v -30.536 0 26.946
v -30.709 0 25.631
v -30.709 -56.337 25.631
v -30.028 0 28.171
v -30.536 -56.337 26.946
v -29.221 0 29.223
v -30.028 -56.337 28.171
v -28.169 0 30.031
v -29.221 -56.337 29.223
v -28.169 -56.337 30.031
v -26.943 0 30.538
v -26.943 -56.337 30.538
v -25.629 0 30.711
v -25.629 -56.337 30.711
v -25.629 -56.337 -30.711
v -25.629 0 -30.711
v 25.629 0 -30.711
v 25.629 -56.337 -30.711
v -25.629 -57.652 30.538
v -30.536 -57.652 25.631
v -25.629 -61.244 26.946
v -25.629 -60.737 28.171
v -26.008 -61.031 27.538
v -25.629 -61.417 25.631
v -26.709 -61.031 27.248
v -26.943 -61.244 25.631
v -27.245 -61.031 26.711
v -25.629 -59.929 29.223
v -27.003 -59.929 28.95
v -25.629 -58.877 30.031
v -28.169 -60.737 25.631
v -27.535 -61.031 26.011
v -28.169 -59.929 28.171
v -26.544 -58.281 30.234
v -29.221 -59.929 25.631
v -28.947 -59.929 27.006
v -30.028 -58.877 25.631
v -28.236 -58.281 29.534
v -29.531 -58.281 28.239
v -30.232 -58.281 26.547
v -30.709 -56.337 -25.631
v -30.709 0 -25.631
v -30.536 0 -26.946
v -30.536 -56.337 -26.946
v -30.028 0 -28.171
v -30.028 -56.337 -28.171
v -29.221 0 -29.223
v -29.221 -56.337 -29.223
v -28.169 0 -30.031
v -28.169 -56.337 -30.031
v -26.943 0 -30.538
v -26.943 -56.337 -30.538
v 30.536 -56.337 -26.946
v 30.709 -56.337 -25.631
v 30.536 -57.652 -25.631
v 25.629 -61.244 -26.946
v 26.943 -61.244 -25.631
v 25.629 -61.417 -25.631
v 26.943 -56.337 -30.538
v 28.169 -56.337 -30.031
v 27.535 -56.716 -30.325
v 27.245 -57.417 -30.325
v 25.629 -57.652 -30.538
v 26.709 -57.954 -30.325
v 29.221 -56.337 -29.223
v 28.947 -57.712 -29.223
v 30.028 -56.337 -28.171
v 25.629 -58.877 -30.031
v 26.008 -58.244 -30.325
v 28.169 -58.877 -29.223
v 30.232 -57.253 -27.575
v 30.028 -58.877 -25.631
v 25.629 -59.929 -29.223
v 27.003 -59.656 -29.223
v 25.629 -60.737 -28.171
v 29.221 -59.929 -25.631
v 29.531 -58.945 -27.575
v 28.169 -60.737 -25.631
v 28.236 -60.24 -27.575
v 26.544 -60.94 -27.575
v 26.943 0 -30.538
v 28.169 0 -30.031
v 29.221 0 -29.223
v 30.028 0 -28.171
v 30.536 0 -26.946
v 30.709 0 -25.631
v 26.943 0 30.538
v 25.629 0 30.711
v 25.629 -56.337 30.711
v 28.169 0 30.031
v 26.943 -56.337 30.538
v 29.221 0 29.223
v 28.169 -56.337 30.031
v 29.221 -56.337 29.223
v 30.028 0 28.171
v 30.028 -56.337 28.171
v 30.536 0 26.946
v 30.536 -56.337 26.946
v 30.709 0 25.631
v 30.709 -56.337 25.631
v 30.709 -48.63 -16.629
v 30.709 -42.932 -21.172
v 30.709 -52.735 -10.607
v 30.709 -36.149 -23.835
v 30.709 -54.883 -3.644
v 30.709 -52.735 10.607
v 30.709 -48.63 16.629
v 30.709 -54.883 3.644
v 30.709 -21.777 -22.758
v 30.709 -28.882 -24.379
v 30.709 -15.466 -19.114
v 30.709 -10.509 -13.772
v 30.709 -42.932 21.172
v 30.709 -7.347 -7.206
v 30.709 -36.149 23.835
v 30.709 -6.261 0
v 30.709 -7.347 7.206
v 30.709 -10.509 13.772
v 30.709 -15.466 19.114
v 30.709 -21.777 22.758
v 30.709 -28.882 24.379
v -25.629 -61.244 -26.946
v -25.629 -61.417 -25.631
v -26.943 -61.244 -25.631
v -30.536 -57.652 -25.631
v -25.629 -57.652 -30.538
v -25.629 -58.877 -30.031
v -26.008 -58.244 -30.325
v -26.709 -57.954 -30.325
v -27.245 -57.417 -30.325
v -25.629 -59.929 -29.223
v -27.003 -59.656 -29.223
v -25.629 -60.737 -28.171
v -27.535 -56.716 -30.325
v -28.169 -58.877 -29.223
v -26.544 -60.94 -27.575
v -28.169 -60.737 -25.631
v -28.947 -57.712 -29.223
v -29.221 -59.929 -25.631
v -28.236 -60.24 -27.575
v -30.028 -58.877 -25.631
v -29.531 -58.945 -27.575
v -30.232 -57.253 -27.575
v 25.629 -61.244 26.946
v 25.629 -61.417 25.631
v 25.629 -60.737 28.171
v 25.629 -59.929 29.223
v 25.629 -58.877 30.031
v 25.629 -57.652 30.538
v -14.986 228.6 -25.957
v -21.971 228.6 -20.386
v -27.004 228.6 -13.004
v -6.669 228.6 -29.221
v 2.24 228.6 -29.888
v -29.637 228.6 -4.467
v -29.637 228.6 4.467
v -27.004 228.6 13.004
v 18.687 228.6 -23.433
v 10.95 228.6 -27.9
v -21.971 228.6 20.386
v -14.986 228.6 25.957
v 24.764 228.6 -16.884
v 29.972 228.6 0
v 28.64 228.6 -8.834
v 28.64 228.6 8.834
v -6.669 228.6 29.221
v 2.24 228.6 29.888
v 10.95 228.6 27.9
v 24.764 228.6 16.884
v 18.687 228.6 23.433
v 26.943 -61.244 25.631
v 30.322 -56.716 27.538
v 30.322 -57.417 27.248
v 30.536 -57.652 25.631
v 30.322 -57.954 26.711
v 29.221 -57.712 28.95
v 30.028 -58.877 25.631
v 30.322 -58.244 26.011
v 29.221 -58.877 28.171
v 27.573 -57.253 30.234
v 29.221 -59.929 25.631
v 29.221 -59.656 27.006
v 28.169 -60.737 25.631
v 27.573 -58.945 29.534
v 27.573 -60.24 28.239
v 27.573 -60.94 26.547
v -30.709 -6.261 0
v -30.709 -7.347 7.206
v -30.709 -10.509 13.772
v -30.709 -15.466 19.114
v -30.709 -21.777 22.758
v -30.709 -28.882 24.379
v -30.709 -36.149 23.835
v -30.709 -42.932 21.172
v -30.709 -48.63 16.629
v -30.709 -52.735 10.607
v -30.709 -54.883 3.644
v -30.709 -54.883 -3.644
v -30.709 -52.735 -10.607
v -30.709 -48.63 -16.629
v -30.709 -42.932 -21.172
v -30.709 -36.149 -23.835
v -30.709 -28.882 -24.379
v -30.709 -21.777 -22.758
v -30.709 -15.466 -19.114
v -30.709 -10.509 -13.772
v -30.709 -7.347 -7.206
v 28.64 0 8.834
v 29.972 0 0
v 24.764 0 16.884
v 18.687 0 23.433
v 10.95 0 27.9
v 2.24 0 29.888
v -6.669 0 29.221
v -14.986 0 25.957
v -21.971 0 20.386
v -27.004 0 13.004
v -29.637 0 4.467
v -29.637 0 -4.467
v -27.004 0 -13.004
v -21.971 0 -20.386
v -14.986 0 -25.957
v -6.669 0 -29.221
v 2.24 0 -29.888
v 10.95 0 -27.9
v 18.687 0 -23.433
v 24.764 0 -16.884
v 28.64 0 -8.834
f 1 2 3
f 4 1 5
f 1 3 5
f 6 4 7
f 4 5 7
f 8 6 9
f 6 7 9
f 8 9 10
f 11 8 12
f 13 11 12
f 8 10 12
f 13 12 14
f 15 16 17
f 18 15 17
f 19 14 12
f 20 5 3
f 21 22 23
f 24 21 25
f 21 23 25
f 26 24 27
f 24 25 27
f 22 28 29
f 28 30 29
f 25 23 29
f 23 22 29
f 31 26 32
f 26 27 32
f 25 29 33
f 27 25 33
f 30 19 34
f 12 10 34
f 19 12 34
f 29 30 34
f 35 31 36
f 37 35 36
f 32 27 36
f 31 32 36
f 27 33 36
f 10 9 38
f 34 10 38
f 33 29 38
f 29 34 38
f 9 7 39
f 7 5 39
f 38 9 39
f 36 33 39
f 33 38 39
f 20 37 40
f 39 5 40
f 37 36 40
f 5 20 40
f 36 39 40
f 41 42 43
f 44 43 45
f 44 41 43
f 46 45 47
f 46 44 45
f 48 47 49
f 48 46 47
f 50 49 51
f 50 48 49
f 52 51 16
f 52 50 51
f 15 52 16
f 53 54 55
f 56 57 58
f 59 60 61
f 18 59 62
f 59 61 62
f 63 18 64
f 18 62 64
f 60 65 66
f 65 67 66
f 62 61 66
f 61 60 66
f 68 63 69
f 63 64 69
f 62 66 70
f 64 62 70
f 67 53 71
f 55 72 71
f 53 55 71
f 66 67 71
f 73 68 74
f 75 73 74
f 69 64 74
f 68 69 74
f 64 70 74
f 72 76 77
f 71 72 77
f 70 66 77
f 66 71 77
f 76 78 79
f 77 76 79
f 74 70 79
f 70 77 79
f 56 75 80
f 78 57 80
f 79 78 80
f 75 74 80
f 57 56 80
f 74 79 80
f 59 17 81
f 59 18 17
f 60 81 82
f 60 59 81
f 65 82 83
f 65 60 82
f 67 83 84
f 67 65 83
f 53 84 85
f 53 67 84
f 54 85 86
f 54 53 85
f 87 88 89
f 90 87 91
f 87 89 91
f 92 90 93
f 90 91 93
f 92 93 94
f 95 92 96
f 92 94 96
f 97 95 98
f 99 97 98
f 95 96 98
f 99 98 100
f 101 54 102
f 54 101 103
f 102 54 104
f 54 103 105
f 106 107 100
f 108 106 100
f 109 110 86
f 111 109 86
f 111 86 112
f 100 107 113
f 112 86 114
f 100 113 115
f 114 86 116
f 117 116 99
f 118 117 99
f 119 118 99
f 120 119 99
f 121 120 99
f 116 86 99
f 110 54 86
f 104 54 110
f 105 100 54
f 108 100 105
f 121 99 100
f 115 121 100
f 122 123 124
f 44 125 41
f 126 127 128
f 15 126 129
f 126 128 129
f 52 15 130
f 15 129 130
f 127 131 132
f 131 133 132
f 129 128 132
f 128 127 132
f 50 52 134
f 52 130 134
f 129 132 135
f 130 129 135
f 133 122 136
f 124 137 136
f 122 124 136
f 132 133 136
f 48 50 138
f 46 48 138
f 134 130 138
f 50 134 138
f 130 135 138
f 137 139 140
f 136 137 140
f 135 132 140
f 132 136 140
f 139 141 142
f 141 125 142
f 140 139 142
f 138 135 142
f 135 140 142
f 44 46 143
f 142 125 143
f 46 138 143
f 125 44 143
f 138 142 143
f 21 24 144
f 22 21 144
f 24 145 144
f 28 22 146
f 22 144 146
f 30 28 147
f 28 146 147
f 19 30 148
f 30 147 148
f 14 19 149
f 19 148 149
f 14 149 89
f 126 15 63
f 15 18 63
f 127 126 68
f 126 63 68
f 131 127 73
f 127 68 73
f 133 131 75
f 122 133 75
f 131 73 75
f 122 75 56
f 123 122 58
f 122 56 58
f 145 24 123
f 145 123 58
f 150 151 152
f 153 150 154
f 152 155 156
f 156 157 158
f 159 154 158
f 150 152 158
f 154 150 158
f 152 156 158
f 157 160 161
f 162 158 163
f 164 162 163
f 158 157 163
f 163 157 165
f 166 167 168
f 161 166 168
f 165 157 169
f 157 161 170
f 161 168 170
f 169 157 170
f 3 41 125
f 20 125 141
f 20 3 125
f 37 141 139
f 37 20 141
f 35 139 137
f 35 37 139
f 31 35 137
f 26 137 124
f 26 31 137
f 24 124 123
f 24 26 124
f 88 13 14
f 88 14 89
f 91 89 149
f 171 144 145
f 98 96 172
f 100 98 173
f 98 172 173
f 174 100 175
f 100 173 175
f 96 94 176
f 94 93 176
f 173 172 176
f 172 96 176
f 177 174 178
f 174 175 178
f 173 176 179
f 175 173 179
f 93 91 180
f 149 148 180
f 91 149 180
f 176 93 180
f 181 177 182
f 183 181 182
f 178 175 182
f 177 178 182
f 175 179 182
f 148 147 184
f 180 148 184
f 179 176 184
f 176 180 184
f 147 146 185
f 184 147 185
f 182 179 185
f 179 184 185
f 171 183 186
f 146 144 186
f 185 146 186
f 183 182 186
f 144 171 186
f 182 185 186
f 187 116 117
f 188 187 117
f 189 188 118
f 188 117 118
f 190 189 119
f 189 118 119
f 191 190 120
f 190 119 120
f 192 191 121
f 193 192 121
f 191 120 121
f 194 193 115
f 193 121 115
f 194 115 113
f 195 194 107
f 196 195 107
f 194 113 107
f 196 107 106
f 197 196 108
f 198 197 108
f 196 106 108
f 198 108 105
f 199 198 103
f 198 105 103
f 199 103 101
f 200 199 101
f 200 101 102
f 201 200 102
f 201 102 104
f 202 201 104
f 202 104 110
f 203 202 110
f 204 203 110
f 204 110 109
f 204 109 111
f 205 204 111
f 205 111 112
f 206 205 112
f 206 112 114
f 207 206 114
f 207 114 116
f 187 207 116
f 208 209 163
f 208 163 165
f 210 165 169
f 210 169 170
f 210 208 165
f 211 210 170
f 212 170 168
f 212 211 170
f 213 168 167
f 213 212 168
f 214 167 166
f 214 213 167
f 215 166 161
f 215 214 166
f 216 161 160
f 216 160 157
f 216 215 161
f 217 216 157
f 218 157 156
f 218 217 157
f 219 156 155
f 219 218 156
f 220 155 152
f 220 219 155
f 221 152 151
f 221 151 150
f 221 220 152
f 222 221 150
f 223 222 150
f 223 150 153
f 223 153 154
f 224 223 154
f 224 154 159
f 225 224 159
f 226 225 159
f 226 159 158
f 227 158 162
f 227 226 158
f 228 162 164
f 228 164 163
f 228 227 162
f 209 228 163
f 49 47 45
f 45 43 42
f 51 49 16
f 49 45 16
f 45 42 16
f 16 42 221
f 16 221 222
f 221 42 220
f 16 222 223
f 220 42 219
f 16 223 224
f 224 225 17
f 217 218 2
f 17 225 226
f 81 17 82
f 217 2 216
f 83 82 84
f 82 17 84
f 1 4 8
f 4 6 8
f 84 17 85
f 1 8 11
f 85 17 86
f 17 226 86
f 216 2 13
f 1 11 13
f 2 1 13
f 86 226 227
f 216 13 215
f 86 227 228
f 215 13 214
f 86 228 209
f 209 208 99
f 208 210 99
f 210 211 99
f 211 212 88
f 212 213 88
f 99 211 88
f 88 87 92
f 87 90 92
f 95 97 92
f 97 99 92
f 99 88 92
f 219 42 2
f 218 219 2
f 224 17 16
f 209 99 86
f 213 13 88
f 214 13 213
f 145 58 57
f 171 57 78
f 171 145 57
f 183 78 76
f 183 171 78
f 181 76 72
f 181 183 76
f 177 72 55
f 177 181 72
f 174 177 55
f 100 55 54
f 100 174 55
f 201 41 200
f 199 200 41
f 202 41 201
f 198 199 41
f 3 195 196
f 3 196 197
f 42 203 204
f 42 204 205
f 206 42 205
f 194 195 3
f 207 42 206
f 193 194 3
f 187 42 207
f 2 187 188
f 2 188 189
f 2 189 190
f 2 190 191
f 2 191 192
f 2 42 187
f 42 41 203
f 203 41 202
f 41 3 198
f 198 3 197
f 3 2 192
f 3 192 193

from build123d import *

# Parameters (mm, degrees)
F0_R     = 29.972
F1_DEPTH = 228.6
F2_W     = 61.4172
F2_H     = 61.4225
F3_DEPTH = 61.4172
F5_D     = 48.895
F6_R     = 5.08


with BuildPart() as f1:
    # F0 (on Front) → F1 (new body)
    with BuildSketch(Plane.XZ):
        Circle(F0_R)
    extrude(amount=-F1_DEPTH)

    # F2 (on Front) → F3 (join)
    with BuildSketch(Plane.XZ):
        Rectangle(F2_W, F2_H)
    extrude(amount=F3_DEPTH)

    # F5 (through all)
    with Locations(Plane(origin=(-30.7086, 0, 0), x_dir=(0, -1, 0), z_dir=(-1, 0, 0))):
        with Locations((30.7086, 0)):
            Hole(F5_D / 2)

    # F6
    f6_edges = [f1.edges().sort_by_distance(p)[0] for p in [
        (-30.7086, -30.7086, 30.71125),
        (0, -61.4172, 30.71125),
        (-30.7086, -61.4172, 0),
        (30.7086, -30.7086, 30.71125),
        (30.7086, -61.4172, 0),
        (30.7086, -30.7086, -30.71125),
        (0, -61.4172, -30.71125),
        (-30.7086, -30.7086, -30.71125),
    ]]
    fillet(f6_edges, radius=F6_R)


solid = f1.part
